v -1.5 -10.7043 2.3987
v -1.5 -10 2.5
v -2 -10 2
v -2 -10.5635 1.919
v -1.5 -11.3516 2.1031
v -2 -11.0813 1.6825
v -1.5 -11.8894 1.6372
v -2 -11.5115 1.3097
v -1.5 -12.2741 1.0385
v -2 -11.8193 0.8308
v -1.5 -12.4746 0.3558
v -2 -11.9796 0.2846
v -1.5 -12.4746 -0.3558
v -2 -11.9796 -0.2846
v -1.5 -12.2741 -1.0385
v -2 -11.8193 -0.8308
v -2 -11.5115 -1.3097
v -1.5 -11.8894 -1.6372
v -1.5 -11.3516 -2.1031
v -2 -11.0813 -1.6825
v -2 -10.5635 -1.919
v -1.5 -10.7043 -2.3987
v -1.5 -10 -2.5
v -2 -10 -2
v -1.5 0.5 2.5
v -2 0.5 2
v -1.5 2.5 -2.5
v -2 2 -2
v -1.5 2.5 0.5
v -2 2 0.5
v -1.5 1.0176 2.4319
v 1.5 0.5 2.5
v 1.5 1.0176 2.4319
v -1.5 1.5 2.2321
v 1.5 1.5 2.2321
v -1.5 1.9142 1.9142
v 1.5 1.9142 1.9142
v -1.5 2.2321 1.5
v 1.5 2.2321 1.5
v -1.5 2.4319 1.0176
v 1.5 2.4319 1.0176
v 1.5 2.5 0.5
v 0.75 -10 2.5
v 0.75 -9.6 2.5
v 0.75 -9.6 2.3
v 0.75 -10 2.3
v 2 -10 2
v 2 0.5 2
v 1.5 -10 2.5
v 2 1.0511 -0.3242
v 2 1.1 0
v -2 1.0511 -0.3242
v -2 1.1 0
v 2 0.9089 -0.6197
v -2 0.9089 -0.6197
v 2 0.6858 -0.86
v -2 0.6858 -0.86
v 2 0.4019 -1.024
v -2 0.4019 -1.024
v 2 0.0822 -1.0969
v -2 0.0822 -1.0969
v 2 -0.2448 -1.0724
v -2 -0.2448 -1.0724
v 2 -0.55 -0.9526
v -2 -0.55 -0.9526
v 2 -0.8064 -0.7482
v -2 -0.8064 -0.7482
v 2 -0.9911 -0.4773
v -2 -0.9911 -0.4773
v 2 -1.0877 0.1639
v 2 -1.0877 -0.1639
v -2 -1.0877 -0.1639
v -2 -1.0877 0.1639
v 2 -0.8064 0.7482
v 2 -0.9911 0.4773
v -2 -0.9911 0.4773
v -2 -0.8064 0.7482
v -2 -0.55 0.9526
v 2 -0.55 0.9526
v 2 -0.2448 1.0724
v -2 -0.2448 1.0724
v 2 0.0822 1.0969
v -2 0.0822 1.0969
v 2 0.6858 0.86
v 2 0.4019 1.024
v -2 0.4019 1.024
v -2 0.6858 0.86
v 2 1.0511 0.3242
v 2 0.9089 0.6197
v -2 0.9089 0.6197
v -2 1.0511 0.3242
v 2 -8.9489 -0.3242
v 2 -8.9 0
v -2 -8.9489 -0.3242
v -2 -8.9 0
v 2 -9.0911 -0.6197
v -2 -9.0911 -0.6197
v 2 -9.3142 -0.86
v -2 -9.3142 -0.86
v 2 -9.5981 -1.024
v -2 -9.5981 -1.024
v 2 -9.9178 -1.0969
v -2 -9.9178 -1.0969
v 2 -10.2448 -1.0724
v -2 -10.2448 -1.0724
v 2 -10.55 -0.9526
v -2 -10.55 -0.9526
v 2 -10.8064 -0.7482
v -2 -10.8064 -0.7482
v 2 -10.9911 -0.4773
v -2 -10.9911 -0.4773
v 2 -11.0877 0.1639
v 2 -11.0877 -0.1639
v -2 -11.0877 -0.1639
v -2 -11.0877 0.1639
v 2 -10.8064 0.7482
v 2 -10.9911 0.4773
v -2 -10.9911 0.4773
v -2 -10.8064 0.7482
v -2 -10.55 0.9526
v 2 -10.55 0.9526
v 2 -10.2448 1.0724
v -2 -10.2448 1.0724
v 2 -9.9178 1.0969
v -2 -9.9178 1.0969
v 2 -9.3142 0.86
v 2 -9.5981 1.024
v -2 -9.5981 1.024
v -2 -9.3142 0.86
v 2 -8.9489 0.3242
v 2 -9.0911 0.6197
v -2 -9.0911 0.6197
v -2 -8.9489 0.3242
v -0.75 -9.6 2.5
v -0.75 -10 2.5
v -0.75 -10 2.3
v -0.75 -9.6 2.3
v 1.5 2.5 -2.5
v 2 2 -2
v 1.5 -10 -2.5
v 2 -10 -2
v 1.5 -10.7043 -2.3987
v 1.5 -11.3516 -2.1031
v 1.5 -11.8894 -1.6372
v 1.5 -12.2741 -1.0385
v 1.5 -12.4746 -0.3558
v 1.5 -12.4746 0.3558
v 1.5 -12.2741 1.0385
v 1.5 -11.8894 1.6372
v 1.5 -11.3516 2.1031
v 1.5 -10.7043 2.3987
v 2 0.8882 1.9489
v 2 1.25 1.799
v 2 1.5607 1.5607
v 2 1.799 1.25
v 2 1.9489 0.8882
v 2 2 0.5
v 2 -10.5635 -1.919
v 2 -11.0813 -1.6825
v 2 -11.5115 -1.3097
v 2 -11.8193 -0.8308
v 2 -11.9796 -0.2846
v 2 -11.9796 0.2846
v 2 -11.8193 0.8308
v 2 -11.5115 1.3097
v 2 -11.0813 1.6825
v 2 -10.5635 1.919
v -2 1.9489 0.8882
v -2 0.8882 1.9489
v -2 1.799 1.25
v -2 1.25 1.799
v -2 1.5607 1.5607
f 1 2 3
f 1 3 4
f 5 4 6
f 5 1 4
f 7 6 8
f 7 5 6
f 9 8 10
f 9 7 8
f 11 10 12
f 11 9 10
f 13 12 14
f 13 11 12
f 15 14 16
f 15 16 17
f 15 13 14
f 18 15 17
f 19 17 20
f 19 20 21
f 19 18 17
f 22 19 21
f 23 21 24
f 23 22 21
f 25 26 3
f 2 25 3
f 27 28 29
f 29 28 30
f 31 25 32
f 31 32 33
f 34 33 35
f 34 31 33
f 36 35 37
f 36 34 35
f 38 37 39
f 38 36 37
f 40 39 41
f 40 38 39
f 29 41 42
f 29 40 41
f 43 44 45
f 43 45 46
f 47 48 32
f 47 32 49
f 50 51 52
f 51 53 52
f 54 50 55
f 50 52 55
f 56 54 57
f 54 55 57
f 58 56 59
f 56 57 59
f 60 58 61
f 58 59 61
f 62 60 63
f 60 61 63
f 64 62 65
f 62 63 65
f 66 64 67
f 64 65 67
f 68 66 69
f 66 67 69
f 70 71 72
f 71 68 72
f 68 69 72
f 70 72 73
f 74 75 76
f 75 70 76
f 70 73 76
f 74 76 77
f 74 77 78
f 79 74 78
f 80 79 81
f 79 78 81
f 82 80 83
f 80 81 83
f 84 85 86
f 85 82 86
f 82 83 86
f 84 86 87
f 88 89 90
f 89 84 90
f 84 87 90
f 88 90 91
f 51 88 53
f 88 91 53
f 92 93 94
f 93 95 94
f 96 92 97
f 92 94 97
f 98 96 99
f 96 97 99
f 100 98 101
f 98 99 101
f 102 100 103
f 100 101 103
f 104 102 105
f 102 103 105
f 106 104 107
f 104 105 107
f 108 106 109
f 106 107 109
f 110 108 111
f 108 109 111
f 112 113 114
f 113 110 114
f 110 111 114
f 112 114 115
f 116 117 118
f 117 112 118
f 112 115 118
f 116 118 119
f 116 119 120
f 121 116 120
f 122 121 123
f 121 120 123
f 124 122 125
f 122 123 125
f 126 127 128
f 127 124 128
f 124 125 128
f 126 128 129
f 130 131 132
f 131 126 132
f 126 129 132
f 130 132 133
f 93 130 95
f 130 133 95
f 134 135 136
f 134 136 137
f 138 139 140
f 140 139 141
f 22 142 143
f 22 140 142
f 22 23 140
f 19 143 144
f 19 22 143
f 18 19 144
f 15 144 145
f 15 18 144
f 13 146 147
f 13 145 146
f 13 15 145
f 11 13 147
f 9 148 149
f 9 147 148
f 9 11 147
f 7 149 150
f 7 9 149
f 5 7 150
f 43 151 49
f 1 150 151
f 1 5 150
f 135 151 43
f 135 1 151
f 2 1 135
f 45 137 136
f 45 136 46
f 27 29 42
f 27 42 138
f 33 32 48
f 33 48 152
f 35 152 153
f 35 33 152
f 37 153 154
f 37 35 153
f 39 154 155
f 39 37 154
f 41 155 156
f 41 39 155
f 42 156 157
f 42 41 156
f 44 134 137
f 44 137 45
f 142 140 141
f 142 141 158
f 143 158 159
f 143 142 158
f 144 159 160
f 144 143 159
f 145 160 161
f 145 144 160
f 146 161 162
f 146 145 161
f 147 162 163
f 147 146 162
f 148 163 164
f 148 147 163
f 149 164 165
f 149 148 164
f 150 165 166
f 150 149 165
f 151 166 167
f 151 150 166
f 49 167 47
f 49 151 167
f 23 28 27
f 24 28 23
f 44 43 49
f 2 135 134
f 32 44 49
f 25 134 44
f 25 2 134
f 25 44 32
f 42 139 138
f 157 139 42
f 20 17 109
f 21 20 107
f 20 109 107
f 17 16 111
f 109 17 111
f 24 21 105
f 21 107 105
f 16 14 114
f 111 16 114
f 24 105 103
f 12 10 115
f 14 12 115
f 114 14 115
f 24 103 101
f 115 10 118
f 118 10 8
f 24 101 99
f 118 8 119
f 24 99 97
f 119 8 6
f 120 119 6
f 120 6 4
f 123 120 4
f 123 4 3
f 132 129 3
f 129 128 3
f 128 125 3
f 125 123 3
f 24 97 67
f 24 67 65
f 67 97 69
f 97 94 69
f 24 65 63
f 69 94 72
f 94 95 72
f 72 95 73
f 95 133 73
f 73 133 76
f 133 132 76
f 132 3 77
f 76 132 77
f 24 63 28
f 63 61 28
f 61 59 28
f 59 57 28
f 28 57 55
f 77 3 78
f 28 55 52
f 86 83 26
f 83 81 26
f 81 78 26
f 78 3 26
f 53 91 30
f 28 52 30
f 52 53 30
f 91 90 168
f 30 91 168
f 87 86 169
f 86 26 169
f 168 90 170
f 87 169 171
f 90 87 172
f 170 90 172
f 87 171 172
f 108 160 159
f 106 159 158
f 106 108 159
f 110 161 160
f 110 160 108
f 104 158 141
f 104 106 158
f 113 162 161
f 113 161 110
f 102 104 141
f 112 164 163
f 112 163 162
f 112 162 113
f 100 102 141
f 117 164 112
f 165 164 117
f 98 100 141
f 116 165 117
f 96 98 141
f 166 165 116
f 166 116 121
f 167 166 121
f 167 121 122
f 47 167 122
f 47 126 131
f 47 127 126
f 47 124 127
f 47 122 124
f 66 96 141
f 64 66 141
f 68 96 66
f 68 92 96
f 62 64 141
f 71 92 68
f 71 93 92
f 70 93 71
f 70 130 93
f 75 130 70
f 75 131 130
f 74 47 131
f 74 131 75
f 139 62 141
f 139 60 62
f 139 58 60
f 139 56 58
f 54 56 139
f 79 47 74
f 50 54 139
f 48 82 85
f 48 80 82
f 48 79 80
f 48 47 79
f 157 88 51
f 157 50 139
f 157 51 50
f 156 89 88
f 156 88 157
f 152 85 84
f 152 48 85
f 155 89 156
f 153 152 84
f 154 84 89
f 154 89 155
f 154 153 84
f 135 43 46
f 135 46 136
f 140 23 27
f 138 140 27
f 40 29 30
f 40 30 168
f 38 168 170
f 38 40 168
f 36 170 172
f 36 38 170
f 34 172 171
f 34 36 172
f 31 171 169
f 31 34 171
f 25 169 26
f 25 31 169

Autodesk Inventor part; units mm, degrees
ref_plane "YZ Plane" through (0, 0, 0) normal (1, 0, 0) x (0, 1, 0)
ref_plane "XZ Plane" through (0, 0, 0) normal (0, 1, 0) x (-1, 0, 0)
ref_plane "XY Plane" through (0, 0, 0) normal (0, 0, 1) x (1, 0, 0)
sketch "Skizze1" plane through (0, 0, 0) normal (1, 0, 0) x (0, 1, 0)
  line L0 (0, 0) -> (-10, 0) construction
  circle A0 centre (0, 0) radius 1.1
  circle A1 centre (-10, 0) radius 1.1
  arc A2 (-10, 2.5) -> (-10, -2.5) centre (-10, 0) ccw
  line L1 (-10, -2.5) -> (2.5, -2.5)
  line L2 (-10, 2.5) -> (0.5, 2.5)
  arc A3 (2.5, 0.5) -> (0.5, 2.5) centre (0.5, 0.5) ccw
  line L3 (2.5, 0.5) -> (2.5, -2.5)
  dimension "d0" = 10
  dimension "d1" = 2.2
  dimension "d2" = 2.2
  dimension "d3" = 2.5
  dimension "d8" = 2
  dimension "d9" = 2.5
extrude "Extrusion1" add sketch "Skizze1" along normal mid plane 4
chamfer "Fase1" distance 0.5 angle 45 10 edges at (2, 1.9142, 1.9142) (2, -4.75, 2.5) (2, -12.5, 0) (2, -3.75, -2.5) (2, 2.5, -1) (-2, 1.9142, 1.9142) (-2, -4.75, 2.5) (-2, -12.5, 0) (-2, -3.75, -2.5) (-2, 2.5, -1)
sketch "Skizze4" plane through (-1.5, -10, 2.5) normal (0, 0, 1) x (1, 0, 0)
  line L0 (1.5, 15.5) -> (1.5, -5.5) construction
  line L1 (0, 0) -> (3, 0) construction
  line L2 (0.75, 0.4) -> (2.25, 0.4)
  line L3 (2.25, 0.4) -> (2.25, 0)
  line L4 (2.25, 0) -> (0.75, 0)
  line L5 (0.75, 0) -> (0.75, 0.4)
  line L6 (0.75, 0.4) -> (2.25, 0) construction
  line L7 (2.25, 0.4) -> (0.75, 0) construction
  point P0 (1.5, 10)
  point P1 (1.5, 0.2)
  point P2 (1.5, 0)
  dimension "d23" = 0.4
  dimension "d24" = 1.5
extrude "Extrusion3" cut sketch "Skizze4" against normal blind 0.2
equation "\"d2\" = d1"
properties part number "Chipanschlag T0.5"
